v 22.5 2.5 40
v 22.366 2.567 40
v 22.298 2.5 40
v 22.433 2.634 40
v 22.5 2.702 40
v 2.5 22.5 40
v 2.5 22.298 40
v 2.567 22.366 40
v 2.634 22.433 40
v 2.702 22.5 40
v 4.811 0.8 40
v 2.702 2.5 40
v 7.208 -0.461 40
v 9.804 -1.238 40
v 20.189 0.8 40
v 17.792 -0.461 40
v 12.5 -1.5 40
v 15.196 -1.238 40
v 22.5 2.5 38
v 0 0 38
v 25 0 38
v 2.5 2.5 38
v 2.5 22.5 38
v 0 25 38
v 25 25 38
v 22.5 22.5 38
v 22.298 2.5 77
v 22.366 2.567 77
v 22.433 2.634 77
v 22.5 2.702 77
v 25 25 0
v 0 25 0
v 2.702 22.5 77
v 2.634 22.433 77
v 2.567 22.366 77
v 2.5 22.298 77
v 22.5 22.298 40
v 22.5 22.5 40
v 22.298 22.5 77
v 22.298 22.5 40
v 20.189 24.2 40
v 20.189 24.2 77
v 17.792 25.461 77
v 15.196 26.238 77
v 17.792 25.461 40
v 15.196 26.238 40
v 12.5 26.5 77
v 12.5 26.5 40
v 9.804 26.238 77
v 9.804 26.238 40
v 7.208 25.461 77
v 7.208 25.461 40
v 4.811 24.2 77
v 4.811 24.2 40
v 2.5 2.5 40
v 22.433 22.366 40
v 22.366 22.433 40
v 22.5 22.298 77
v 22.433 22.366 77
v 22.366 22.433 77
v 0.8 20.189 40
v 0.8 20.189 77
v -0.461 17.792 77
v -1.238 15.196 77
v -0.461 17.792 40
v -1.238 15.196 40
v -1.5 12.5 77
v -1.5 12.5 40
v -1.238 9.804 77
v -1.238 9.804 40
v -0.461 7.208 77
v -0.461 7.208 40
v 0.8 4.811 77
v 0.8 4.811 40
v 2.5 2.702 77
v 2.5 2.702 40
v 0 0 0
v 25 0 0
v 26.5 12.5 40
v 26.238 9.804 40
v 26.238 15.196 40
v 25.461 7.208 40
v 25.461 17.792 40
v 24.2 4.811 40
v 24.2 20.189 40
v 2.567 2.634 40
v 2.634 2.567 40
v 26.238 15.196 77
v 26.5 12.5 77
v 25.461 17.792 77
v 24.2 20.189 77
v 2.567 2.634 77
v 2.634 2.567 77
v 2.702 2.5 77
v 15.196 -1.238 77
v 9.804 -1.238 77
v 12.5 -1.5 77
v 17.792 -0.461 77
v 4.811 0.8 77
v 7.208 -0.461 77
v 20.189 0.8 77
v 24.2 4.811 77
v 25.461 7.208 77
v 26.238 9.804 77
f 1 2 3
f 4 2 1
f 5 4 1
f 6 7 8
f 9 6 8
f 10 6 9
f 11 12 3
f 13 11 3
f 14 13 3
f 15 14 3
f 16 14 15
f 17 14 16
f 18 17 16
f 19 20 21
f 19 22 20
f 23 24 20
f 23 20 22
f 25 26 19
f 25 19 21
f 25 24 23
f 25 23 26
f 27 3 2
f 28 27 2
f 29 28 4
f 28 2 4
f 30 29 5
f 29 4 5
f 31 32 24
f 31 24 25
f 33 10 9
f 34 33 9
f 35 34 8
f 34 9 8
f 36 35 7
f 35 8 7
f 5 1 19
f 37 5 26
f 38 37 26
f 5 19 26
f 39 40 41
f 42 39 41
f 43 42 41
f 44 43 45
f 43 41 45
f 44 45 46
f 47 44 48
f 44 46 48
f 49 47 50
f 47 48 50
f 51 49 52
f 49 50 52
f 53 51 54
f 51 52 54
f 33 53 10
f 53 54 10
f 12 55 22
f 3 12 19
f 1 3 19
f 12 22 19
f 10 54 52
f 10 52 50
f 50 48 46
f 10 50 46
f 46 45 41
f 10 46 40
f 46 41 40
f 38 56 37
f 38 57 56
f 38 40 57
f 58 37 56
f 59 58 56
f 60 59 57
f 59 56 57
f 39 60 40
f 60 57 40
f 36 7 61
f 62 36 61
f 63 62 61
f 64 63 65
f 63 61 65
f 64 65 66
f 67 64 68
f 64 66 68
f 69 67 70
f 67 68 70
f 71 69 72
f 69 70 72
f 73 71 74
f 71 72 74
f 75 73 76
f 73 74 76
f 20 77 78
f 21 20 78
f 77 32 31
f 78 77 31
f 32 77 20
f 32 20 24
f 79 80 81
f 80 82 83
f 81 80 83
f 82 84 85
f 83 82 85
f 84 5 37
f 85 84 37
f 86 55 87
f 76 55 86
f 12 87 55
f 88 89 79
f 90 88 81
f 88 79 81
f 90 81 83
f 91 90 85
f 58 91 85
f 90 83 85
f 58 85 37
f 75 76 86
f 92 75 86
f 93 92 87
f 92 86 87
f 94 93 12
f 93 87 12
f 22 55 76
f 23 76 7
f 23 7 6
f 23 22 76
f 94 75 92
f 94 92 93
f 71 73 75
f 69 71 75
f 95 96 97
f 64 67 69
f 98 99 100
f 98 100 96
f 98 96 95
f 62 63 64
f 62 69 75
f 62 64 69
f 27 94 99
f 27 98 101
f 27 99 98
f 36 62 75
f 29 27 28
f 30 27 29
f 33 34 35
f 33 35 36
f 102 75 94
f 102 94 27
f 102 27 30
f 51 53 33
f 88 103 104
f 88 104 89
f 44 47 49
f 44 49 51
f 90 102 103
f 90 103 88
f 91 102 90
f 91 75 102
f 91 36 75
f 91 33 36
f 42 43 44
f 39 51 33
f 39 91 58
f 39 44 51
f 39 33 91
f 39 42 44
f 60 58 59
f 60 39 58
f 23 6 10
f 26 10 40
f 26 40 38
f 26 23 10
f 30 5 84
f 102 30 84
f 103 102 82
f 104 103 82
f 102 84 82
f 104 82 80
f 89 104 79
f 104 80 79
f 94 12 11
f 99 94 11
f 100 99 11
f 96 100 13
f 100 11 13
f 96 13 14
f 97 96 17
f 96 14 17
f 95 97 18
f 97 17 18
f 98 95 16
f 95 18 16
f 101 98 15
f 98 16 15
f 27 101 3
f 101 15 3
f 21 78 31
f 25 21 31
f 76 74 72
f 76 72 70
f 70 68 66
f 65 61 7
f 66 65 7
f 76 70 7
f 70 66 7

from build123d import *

# Parameters (mm, degrees)
F0_W     = 25
F0_H     = 25
F1_DEPTH = 38
F2_W     = 20
F2_H     = 20
F3_DEPTH = 2
F5_DEPTH = 37


with BuildPart() as f1:
    # F0 (on Top) → F1 (new body)
    with BuildSketch(Plane.XY):
        with Locations((12.5, 12.5)):
            Rectangle(F0_W, F0_H)
    extrude(amount=F1_DEPTH)

    # F2 (on face) → F3 (join)
    with BuildSketch(Plane.XY.offset(38)):
        with Locations((12.5, 12.5)):
            Rectangle(F2_W, F2_H)
    extrude(amount=F3_DEPTH)

    # F4 (on face) → F5 (join)
    with BuildSketch(Plane.XY.offset(40)):
        with BuildLine():
            ThreePointArc((22.5, 2.7020410289), (25.4614813968, 7.2084973779), (26.5, 12.5))
            ThreePointArc((26.5, 12.5), (25.4614813968, 17.7915026221), (22.5, 22.2979589711))
            Line((22.5, 22.2979589711), (22.5, 2.7020410289))
        make_face()
        with BuildLine():
            Line((22.5, 2.7020410289), (22.5, 22.2979589711))
            ThreePointArc((22.5, 22.2979589711), (22.3994949366, 22.3994949366), (22.2979589711, 22.5))
            Line((22.2979589711, 22.5), (2.7020410289, 22.5))
            ThreePointArc((2.7020410289, 22.5), (2.6005050634, 22.3994949366), (2.5, 22.2979589711))
            Line((2.5, 22.2979589711), (2.5, 2.7020410289))
            ThreePointArc((2.5, 2.7020410289), (2.6005050634, 2.6005050634), (2.7020410289, 2.5))
            Line((2.7020410289, 2.5), (22.2979589711, 2.5))
            ThreePointArc((22.2979589711, 2.5), (22.3994949366, 2.6005050634), (22.5, 2.7020410289))
        make_face()
        with BuildLine():
            Line((2.7020410289, 22.5), (22.2979589711, 22.5))
            ThreePointArc((22.2979589711, 22.5), (12.5, 26.5), (2.7020410289, 22.5))
        make_face()
        with BuildLine():
            ThreePointArc((2.7020410289, 2.5), (12.5, -1.5), (22.2979589711, 2.5))
            Line((22.2979589711, 2.5), (2.7020410289, 2.5))
        make_face()
        with BuildLine():
            Line((2.5, 2.7020410289), (2.5, 22.2979589711))
            ThreePointArc((2.5, 22.2979589711), (-1.5, 12.5), (2.5, 2.7020410289))
        make_face()
    extrude(amount=F5_DEPTH)


solid = f1.part
